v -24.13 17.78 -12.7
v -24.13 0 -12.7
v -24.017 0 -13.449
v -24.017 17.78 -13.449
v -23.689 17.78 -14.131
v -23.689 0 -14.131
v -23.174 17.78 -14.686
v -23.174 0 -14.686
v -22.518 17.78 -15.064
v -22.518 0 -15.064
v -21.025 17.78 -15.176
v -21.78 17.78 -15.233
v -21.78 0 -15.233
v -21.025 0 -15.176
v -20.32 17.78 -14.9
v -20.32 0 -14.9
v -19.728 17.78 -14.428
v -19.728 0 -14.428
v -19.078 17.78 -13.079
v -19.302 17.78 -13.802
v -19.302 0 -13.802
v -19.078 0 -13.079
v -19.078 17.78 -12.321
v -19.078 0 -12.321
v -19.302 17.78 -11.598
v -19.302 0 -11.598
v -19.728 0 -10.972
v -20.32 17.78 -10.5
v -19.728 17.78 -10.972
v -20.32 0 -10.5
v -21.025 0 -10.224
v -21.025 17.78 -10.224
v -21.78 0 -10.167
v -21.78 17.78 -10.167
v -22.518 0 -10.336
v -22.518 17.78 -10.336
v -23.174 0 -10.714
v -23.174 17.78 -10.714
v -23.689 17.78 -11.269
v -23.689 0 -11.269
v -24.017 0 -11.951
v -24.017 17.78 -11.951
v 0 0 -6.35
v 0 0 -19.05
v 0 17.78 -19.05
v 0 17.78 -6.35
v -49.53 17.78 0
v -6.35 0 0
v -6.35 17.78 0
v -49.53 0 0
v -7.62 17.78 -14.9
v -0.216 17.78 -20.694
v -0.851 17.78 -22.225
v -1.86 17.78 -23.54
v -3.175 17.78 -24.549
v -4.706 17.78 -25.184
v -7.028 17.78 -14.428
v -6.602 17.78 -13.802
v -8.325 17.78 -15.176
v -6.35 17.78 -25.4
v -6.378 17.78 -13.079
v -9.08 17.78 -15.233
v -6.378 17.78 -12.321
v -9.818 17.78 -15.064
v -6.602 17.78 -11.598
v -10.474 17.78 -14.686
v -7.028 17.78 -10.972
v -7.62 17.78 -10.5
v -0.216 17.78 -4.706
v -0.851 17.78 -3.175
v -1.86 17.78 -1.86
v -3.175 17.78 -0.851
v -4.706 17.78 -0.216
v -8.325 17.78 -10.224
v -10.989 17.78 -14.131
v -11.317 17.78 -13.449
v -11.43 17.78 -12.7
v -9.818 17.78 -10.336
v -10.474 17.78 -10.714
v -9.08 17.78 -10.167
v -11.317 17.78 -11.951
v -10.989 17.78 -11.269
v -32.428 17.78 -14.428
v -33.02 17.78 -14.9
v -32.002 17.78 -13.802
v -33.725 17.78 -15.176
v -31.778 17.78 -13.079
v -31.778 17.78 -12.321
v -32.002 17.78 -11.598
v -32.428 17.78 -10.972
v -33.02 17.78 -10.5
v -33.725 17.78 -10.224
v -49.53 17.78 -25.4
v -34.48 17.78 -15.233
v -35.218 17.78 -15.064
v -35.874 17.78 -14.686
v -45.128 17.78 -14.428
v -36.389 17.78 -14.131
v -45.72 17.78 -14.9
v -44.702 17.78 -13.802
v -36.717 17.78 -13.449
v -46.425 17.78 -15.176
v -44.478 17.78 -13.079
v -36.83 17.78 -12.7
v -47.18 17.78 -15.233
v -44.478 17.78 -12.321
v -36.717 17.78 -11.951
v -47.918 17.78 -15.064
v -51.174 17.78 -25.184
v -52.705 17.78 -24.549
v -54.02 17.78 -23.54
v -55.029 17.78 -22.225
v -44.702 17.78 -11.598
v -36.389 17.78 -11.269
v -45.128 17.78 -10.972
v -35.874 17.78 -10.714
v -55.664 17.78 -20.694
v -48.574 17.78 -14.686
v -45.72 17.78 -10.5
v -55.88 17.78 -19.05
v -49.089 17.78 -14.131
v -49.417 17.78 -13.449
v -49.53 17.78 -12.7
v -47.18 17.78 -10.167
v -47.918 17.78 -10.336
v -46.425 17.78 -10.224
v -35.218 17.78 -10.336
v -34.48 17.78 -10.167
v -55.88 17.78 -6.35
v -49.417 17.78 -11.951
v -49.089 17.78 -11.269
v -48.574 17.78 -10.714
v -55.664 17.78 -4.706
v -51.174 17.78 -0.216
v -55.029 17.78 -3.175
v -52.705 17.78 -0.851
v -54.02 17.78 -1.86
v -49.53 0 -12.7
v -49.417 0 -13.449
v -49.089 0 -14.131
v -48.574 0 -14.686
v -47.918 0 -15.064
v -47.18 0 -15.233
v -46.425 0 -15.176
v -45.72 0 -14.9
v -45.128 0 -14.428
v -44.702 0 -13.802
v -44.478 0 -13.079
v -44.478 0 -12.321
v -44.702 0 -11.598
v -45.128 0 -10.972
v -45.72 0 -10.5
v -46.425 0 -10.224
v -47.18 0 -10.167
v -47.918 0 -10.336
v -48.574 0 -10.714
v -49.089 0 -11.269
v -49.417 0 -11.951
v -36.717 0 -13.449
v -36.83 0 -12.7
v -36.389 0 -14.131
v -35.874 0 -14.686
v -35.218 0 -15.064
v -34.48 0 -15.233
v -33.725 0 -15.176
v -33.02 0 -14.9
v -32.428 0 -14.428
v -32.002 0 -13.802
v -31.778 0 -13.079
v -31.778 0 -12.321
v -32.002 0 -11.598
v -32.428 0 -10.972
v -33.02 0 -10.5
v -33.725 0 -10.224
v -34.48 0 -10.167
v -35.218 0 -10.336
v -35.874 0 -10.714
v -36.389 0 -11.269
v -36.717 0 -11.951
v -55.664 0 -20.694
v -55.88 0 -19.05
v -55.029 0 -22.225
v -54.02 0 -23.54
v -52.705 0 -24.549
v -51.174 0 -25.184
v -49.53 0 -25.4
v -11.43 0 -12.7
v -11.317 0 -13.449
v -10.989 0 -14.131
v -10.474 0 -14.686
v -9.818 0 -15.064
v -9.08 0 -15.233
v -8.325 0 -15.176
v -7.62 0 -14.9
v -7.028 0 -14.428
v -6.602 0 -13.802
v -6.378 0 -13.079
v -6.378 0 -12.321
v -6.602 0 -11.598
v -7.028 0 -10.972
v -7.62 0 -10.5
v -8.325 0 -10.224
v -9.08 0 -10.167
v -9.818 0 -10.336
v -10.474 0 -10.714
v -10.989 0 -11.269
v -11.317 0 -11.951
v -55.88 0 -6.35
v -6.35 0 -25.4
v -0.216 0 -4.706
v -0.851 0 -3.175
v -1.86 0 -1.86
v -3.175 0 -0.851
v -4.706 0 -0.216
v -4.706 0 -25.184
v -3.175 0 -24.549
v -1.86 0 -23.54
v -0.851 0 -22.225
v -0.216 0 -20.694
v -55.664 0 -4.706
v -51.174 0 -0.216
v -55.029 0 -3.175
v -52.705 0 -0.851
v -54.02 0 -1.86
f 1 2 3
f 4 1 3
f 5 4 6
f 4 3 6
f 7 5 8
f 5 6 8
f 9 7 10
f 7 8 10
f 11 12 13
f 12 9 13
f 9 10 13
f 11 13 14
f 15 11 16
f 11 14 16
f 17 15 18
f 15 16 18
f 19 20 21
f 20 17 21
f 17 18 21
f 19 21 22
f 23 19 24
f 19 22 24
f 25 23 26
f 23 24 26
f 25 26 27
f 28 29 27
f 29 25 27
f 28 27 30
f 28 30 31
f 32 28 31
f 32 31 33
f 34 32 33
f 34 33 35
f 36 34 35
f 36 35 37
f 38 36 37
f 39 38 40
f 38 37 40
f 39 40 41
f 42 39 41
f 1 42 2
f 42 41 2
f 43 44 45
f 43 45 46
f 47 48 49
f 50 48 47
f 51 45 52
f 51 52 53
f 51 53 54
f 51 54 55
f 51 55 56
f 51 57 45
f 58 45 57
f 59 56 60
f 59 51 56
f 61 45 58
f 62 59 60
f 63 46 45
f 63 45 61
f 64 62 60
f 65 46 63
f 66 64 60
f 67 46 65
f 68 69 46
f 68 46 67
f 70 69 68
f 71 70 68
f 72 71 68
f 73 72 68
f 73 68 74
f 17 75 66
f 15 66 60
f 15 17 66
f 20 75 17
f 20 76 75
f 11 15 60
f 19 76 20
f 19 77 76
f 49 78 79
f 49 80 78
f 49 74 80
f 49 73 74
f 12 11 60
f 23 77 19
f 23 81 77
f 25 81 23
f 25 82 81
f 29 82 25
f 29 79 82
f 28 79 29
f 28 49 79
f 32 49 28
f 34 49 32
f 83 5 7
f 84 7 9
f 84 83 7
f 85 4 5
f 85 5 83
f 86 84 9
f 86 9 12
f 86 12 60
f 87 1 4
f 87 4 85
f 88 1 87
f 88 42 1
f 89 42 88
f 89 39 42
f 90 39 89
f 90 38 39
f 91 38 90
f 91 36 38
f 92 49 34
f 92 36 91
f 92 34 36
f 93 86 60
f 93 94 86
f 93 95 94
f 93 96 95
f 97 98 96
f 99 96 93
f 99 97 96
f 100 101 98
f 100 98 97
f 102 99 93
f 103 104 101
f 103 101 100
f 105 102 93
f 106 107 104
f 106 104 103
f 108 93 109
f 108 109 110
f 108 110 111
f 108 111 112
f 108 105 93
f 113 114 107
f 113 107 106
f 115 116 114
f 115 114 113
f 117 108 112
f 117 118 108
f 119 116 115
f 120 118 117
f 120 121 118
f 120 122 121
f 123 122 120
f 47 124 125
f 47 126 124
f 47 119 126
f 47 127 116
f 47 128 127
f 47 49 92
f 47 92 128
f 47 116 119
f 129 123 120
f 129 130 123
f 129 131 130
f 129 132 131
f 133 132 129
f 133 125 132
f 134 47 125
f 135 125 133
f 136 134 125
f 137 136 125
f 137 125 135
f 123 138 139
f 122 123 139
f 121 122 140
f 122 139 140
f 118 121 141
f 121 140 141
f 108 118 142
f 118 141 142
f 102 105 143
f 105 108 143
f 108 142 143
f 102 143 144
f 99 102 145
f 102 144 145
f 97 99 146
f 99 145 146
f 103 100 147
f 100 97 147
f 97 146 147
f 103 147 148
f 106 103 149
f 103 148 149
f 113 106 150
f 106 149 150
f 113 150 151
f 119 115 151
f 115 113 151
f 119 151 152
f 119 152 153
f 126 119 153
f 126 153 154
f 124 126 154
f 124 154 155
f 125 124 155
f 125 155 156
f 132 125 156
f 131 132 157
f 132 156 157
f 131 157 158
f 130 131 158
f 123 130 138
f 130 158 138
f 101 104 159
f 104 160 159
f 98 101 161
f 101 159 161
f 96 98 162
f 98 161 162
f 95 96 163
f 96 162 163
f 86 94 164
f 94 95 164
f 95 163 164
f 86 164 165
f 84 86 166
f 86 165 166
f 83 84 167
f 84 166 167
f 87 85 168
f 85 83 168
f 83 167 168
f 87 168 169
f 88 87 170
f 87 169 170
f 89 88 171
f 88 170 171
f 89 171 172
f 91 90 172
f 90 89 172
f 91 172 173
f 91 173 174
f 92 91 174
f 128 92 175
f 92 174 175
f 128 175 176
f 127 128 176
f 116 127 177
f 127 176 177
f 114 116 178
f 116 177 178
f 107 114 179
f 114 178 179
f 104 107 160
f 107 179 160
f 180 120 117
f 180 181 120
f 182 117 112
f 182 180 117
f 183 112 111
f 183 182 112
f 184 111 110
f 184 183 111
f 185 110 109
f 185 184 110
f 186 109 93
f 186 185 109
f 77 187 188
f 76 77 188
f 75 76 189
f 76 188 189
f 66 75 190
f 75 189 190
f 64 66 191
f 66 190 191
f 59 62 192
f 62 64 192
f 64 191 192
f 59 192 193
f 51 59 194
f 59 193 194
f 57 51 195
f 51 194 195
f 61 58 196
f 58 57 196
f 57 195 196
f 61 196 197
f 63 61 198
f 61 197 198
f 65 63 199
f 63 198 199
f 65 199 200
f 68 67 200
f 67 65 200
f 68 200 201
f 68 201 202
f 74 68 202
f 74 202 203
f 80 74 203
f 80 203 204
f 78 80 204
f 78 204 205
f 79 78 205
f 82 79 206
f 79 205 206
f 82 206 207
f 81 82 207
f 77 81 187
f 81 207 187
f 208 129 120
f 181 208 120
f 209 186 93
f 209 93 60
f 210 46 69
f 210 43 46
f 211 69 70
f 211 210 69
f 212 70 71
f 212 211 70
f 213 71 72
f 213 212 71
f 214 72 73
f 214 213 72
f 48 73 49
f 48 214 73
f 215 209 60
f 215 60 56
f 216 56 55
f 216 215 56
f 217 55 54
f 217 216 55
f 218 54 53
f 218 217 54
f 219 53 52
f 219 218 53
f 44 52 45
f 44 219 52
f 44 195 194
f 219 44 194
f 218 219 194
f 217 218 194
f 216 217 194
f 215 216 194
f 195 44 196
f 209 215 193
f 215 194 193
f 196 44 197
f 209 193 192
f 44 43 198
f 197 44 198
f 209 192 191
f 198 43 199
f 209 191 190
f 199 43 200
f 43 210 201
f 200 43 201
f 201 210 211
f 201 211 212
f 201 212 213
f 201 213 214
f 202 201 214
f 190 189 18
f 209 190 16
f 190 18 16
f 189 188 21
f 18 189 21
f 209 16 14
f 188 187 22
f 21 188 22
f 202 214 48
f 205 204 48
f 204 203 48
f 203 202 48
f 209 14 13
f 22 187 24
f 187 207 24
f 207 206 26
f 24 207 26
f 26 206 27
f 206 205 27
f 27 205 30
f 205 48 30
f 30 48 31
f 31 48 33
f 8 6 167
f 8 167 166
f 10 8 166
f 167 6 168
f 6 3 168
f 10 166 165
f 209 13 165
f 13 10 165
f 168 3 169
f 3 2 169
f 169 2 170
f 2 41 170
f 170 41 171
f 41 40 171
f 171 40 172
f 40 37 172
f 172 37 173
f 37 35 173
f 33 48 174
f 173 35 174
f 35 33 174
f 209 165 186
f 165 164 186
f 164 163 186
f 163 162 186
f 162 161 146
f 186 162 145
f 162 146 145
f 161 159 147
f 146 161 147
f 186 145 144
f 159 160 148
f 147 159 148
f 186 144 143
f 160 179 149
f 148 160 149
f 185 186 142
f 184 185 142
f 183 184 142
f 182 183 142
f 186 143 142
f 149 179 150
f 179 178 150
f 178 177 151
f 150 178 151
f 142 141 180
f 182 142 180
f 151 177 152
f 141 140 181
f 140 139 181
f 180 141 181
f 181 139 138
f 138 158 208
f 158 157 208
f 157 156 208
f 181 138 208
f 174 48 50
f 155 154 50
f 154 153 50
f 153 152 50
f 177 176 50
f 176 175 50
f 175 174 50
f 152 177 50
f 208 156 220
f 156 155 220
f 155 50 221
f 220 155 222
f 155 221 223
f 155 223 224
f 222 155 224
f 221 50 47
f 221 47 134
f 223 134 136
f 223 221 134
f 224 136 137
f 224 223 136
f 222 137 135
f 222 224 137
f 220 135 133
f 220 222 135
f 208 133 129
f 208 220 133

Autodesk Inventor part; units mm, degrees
ref_plane "YZ Plane" through (0, 0, 0) normal (1, 0, 0) x (0, 1, 0)
ref_plane "XZ Plane" through (0, 0, 0) normal (0, 1, 0) x (-1, 0, 0)
ref_plane "XY Plane" through (0, 0, 0) normal (0, 0, 1) x (1, 0, 0)
sketch "Sketch1" plane through (0, 0, 0) normal (0, 1, 0) x (-1, 0, 0)
  line L0 (6.35, 0) -> (49.53, 0)
  line L1 (55.88, -6.35) -> (55.88, -19.05)
  line L2 (49.53, -25.4) -> (6.35, -25.4)
  line L3 (0, -19.05) -> (0, -6.35)
  circle A0 centre (46.99, -12.7) radius 2.54
  circle A1 centre (34.29, -12.7) radius 2.54
  circle A2 centre (21.59, -12.7) radius 2.54
  circle A3 centre (8.89, -12.7) radius 2.54
  line L4 (46.99, -12.7) -> (8.89, -12.7) construction
  arc A4 (49.53, -25.4) -> (55.88, -19.05) centre (49.53, -19.05) ccw
  arc A5 (55.88, -6.35) -> (49.53, 0) centre (49.53, -6.35) ccw
  arc A6 (6.35, 0) -> (0, -6.35) centre (6.35, -6.35) ccw
  arc A7 (0, -19.05) -> (6.35, -25.4) centre (6.35, -19.05) ccw
  point P0 (0, 0)
  dimension "d0" = 25.4
  dimension "d1" = 55.88
  dimension "d2" = 5.08
  dimension "d3" = 12.7
  dimension "d4" = 12.7
  dimension "d5" = 12.7
  dimension "d6" = 12.7
  dimension "d7" = 8.89
  dimension "d8" = 6.35
extrude "Extrusion1" add sketch "Sketch1" along normal blind 17.78
properties part number "ELEV_023_BILLET2" material "Aluminum 6061"
